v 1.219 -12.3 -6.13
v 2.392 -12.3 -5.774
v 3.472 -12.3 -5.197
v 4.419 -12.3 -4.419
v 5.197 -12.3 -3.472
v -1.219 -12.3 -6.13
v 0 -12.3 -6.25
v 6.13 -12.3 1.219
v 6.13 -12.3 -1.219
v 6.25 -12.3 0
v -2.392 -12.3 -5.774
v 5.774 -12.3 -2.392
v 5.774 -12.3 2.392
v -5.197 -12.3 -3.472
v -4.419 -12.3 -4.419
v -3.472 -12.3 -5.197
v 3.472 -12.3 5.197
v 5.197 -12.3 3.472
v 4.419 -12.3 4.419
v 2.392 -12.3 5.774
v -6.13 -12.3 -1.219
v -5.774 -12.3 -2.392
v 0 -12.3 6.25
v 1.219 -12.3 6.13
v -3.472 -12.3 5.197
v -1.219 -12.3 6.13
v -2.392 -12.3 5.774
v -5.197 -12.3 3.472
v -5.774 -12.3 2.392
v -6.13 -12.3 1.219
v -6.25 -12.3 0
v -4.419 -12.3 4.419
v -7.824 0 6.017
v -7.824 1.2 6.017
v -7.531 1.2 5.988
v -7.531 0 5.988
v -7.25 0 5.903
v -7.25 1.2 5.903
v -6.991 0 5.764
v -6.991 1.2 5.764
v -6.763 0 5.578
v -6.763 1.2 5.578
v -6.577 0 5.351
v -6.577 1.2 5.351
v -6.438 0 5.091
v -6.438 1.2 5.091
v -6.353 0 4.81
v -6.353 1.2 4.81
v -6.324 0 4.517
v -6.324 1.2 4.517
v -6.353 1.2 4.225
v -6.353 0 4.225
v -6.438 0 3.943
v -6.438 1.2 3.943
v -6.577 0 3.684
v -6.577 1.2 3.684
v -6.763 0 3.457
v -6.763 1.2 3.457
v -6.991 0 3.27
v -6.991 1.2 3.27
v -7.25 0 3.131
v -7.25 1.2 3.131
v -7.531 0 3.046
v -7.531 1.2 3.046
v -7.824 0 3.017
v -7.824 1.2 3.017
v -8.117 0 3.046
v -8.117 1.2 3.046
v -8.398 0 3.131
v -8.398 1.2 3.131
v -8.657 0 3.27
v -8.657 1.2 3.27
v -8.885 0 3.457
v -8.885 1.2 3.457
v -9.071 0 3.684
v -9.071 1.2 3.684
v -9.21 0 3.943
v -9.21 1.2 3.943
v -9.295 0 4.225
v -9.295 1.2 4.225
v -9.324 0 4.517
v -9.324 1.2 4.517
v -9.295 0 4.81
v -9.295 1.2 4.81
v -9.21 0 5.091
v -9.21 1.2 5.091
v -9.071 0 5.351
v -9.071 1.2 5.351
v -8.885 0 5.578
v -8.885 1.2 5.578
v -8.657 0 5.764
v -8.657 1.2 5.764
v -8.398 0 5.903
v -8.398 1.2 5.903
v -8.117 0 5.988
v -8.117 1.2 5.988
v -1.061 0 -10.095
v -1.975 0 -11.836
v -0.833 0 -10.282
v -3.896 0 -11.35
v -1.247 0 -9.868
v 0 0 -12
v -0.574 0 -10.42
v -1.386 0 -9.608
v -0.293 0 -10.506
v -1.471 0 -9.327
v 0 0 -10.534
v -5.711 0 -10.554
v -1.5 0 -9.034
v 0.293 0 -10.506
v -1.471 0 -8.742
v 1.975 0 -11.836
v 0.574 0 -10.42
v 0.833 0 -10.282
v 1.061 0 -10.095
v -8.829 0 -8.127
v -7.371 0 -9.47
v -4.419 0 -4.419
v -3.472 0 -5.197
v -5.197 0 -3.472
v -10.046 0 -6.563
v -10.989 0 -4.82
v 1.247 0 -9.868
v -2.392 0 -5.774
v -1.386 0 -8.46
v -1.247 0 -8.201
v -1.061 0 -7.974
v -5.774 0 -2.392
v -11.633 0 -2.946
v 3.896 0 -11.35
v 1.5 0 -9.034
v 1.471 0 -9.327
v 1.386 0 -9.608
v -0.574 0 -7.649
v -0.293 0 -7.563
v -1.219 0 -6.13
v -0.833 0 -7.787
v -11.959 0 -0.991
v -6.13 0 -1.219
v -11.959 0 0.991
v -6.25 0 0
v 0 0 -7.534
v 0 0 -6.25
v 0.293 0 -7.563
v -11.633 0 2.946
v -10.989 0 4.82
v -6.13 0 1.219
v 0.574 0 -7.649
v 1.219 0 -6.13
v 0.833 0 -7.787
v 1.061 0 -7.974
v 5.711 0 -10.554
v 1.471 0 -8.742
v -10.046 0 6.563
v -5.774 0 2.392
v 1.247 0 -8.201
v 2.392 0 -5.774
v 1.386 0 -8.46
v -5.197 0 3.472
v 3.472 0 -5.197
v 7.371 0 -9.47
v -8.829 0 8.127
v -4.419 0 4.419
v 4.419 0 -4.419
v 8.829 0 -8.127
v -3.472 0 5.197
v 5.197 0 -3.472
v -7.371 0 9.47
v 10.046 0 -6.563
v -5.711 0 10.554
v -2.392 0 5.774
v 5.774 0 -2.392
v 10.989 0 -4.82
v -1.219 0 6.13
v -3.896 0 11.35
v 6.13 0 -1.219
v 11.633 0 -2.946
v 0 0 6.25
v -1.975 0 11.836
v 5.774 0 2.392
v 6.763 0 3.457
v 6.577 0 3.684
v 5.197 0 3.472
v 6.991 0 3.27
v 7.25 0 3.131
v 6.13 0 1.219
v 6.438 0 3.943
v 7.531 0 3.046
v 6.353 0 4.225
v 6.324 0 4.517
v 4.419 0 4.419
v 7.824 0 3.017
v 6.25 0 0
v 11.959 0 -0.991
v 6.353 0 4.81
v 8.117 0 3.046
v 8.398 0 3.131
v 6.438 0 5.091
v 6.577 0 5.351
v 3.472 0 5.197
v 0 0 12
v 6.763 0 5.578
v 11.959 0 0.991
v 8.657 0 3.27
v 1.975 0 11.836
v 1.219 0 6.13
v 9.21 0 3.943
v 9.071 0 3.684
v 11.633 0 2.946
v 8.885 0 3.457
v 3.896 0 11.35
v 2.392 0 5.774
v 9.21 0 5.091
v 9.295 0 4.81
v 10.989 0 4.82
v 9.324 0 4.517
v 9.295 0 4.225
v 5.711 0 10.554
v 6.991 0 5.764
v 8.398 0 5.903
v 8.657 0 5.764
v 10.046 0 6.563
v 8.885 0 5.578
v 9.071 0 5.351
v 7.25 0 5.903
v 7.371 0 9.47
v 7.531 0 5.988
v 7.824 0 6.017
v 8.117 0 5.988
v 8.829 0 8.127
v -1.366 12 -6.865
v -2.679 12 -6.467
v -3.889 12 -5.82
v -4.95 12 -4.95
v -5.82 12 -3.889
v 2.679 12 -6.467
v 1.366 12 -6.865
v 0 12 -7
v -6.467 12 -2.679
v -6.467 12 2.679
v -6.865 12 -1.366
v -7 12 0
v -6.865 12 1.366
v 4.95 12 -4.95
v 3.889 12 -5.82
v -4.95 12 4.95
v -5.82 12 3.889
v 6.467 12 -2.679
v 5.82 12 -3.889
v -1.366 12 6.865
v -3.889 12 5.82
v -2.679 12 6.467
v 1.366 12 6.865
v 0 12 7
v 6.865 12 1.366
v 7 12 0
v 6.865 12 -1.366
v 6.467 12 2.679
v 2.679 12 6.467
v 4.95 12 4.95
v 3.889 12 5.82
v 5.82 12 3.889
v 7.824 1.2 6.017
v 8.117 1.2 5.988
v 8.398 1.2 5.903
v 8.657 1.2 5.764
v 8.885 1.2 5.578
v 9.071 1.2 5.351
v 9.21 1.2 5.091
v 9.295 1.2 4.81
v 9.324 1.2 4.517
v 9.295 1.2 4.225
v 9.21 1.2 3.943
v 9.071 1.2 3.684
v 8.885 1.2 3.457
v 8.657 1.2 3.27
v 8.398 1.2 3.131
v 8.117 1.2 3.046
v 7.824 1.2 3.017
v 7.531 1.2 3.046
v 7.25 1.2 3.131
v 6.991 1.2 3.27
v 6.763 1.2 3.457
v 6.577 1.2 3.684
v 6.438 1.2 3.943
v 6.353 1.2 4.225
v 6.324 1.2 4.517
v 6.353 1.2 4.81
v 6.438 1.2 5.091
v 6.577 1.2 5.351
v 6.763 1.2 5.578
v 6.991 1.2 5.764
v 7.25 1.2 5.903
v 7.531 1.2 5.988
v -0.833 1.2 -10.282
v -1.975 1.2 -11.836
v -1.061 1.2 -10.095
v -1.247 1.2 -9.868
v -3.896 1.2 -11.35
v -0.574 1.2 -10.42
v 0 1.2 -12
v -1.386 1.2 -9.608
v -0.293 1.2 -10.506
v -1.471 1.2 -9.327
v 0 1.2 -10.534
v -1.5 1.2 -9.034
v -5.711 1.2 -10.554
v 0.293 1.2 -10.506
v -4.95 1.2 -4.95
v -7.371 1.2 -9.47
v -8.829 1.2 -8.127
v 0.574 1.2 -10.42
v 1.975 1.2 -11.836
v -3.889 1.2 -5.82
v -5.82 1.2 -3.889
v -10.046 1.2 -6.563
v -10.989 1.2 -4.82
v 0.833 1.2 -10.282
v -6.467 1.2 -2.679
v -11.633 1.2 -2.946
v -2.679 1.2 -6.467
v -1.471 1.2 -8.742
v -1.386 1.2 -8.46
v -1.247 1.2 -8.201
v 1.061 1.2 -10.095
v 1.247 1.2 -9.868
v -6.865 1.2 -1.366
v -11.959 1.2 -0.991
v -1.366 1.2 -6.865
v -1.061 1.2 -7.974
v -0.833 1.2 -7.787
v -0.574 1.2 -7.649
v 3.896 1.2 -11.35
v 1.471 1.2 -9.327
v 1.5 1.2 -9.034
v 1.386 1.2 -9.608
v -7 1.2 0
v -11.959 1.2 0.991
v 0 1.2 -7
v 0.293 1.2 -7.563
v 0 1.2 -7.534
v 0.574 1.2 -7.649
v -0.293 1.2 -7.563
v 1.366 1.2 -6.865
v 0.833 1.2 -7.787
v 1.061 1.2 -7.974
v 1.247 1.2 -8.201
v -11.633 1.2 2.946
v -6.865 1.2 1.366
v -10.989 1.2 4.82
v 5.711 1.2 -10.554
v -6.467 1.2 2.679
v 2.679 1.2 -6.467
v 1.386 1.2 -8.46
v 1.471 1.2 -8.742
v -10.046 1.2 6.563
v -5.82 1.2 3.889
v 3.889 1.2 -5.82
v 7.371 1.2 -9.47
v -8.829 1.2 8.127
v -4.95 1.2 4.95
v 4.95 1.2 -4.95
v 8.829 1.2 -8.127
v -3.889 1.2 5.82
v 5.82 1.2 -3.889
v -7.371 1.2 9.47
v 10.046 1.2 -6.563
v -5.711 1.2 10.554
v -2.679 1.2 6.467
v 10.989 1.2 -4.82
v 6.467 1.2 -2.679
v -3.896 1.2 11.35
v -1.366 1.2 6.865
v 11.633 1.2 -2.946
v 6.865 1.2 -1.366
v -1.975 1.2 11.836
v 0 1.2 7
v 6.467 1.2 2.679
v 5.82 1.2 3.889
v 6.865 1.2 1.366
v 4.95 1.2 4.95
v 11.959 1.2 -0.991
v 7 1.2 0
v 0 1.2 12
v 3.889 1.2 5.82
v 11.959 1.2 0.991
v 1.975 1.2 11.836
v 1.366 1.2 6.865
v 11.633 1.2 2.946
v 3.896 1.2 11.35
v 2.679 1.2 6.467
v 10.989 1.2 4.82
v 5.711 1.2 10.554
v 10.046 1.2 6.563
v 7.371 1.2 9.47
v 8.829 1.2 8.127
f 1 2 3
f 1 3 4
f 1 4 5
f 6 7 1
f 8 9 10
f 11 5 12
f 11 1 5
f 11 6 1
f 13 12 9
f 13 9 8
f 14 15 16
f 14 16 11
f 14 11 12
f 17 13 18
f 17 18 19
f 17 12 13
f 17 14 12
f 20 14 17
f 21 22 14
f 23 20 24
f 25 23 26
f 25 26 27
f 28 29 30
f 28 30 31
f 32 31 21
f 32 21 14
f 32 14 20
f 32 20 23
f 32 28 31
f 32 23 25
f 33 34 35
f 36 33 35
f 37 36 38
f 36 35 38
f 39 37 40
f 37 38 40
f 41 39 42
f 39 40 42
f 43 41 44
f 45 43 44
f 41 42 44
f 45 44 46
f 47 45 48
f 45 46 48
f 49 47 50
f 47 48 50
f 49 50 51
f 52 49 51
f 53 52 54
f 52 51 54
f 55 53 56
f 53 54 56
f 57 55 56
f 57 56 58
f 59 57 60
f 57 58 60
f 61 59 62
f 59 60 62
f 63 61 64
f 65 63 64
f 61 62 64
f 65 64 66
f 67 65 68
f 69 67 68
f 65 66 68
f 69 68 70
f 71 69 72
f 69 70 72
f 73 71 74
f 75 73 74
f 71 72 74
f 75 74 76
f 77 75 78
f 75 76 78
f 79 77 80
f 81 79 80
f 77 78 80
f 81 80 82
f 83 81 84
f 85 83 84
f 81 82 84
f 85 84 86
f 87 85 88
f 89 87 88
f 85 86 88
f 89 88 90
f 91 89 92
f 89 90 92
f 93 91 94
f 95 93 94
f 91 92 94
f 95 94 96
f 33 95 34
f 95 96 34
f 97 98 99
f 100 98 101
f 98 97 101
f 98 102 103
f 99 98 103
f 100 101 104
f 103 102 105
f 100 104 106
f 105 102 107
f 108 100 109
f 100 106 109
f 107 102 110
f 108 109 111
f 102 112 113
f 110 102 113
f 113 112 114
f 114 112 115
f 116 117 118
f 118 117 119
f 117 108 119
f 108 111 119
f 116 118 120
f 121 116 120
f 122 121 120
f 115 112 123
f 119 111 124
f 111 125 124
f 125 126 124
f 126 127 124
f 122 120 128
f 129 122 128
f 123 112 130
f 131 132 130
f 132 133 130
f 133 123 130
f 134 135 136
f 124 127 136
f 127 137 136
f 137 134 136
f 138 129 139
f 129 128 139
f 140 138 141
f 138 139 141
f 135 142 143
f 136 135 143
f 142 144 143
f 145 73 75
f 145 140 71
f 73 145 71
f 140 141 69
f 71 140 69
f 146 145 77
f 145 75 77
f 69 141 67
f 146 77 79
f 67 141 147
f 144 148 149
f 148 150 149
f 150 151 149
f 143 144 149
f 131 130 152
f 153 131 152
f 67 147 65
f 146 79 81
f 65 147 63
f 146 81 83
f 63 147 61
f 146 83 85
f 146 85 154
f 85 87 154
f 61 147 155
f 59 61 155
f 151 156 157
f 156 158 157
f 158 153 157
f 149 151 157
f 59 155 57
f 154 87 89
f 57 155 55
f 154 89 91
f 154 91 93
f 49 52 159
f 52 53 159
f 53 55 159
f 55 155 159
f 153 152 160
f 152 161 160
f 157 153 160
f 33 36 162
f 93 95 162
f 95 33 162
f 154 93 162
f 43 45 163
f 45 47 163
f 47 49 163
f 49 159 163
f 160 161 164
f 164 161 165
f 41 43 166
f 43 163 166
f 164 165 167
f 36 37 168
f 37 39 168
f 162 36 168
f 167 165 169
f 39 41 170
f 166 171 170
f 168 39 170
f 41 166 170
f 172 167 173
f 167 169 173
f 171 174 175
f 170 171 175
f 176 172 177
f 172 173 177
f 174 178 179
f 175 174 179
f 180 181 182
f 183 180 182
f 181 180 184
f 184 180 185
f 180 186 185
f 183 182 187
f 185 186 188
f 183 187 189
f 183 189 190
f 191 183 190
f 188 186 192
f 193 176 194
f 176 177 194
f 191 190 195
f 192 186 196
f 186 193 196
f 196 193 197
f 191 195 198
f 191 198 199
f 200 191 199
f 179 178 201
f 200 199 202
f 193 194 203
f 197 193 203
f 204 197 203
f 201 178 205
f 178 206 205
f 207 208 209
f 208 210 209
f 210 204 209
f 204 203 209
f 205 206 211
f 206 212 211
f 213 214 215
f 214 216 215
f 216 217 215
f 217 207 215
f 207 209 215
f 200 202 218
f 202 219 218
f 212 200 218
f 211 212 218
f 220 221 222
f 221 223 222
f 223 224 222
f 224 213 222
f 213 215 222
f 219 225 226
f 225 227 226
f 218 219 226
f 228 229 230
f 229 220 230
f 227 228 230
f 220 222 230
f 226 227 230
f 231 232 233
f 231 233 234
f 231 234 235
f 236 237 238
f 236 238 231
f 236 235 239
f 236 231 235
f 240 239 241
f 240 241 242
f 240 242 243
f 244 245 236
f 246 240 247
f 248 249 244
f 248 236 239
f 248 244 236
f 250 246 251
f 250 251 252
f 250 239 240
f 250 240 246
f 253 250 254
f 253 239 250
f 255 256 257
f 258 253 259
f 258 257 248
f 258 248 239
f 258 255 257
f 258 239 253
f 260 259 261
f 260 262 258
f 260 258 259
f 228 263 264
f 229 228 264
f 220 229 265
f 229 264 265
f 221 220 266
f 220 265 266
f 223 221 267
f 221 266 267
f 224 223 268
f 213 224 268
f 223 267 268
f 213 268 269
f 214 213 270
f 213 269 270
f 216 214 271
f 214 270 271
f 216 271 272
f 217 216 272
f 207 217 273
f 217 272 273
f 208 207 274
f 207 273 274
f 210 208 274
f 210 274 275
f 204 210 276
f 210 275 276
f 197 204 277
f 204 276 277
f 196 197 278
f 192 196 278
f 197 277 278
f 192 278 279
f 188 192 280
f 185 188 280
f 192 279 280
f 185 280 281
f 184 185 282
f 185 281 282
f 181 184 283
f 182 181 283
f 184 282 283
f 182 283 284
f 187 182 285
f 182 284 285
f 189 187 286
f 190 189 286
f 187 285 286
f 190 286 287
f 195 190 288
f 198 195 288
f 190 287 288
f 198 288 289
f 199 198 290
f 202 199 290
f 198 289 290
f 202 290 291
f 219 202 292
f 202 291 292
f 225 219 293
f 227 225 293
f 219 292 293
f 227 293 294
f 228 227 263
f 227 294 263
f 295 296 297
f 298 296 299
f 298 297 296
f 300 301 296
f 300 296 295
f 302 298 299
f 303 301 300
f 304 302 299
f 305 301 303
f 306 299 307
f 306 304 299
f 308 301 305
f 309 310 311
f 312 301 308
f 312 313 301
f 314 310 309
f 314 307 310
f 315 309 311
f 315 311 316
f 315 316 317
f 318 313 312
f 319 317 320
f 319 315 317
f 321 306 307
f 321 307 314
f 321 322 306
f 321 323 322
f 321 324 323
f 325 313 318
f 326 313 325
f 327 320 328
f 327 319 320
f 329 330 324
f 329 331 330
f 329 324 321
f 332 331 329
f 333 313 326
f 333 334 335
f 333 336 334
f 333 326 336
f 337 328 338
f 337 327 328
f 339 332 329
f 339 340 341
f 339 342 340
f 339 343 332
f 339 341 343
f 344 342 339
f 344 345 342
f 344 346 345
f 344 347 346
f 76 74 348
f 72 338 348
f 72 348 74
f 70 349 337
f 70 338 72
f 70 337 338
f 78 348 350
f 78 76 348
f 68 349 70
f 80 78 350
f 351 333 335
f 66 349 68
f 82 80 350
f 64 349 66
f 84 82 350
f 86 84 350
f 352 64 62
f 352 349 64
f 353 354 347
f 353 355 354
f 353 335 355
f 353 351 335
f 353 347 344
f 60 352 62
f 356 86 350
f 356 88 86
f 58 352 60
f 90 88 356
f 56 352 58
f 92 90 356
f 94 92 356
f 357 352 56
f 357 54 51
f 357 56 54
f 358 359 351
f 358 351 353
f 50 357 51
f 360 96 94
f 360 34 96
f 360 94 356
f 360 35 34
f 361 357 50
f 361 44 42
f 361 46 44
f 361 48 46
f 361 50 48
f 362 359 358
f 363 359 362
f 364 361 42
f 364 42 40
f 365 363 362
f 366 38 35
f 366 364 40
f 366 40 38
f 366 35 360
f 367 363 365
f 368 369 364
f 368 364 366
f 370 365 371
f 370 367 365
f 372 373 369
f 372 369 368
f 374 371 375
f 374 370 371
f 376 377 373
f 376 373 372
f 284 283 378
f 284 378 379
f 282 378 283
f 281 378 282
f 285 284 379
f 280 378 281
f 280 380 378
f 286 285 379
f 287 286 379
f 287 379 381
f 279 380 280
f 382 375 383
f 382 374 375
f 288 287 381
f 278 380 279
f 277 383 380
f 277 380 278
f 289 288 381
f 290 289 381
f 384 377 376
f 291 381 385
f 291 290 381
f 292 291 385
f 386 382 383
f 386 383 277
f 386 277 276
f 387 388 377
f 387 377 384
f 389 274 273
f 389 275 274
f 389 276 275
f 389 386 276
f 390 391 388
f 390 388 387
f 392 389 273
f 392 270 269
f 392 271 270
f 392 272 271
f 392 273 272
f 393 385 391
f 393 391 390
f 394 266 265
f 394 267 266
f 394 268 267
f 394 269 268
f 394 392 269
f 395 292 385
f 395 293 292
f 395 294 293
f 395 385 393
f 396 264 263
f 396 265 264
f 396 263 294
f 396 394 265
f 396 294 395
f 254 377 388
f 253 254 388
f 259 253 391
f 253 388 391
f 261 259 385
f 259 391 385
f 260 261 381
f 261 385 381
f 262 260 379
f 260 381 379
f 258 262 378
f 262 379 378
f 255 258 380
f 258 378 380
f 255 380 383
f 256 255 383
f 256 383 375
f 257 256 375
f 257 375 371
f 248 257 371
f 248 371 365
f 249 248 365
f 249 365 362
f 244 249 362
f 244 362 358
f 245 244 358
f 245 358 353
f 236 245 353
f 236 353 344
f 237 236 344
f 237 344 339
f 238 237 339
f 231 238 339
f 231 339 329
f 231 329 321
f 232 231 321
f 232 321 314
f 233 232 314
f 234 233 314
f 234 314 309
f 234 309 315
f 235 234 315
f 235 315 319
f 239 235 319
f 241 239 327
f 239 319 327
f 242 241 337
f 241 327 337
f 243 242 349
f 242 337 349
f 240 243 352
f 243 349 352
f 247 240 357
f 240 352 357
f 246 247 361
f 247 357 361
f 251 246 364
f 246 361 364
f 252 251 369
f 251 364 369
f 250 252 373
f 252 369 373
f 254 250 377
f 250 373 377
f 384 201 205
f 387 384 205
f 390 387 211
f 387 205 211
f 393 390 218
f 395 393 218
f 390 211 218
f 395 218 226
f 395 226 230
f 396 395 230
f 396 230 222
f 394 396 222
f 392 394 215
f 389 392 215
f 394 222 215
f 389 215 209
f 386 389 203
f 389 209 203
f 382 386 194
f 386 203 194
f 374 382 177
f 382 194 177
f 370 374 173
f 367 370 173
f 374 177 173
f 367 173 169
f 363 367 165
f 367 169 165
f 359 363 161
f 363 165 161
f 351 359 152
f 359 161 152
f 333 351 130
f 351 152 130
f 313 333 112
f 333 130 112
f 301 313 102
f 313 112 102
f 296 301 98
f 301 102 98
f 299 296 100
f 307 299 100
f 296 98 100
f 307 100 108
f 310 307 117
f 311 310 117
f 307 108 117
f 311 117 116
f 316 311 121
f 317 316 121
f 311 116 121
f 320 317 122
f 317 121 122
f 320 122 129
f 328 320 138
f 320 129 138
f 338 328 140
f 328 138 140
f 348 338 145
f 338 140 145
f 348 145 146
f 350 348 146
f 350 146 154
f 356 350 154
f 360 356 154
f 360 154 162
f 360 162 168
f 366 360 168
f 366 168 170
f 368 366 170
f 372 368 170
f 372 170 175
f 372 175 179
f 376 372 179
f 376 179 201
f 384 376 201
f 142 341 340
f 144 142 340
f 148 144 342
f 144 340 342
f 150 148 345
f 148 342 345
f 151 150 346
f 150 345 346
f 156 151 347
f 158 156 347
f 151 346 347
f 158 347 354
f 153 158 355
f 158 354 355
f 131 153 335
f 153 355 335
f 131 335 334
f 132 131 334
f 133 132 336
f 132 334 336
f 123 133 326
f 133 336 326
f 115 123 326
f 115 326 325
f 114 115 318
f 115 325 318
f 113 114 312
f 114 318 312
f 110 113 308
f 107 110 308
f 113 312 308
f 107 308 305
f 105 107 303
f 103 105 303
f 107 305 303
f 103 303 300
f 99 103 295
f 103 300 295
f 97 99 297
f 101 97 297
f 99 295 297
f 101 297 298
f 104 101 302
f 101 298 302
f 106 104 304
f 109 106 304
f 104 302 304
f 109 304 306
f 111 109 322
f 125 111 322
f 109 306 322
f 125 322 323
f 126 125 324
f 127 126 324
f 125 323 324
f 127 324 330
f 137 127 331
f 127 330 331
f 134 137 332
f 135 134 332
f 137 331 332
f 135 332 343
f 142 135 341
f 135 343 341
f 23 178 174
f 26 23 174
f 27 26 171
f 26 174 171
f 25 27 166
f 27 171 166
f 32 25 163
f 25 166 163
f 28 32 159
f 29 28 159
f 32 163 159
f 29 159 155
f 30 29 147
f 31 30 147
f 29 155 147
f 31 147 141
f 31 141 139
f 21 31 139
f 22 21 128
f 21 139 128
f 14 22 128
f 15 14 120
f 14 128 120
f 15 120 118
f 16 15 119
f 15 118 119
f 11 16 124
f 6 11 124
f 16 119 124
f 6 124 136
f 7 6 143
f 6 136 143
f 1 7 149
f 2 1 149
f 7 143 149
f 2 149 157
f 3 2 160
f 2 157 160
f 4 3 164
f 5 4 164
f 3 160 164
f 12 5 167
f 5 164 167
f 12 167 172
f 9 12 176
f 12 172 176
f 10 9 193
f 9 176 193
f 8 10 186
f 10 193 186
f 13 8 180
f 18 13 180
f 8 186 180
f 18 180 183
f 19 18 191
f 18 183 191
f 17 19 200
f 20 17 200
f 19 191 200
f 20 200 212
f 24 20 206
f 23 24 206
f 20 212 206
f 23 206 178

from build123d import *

# Parameters (mm, degrees)
SKETCH1_R           = 12
SKETCH1_R_2         = 2.5
BOSS_EXTRUDE1_DEPTH = 1.2
SKETCH2_R           = 1.5
CUT_EXTRUDE1_DEPTH  = 1.2
SKETCH3_R           = 6.25
BOSS_EXTRUDE2_DEPTH = 12.3
SKETCH4_R           = 7
BOSS_EXTRUDE3_DEPTH = 12


with BuildPart() as part:
    # Sketch1 → Boss-Extrude1 (new body)
    with BuildSketch(Plane(origin=(0, 0, 0), x_dir=(1, 0, 0), z_dir=(0, 1, 0))):
        with Locations(Location((0, 0, 0), (0, 0, 270))):
            Circle(SKETCH1_R)
        with Locations(Location((0, 0, 0), (0, 0, 270))):
            Circle(SKETCH1_R_2, mode=Mode.SUBTRACT)
    extrude(amount=BOSS_EXTRUDE1_DEPTH)

    # Sketch2 → Cut-Extrude1 (cut)
    with BuildSketch(Plane(origin=(0, 1.2, 0), x_dir=(1, 0, 0), z_dir=(0, 1, 0))):
        with Locations(Location((0, 9.034469011, 0), (0, 0, 270))):
            Circle(SKETCH2_R)
        with Locations(Location((7.824079673, -4.517234506, 0), (0, 0, 270))):
            Circle(SKETCH2_R)
        with Locations(Location((-7.824079673, -4.517234506, 0), (0, 0, 270))):
            Circle(SKETCH2_R)
    extrude(amount=-CUT_EXTRUDE1_DEPTH, mode=Mode.SUBTRACT)

    # Sketch3 → Boss-Extrude2 (add)
    with BuildSketch(Plane(origin=(0, 0, 0), x_dir=(-1, 0, 0), z_dir=(0, -1, 0))):
        with Locations(Location((0, 0, 0), (0, 0, 270))):
            Circle(SKETCH3_R)
    extrude(amount=BOSS_EXTRUDE2_DEPTH)

    # Sketch4 → Boss-Extrude3 (add)
    with BuildSketch(Plane(origin=(0, 0, 0), x_dir=(1, 0, 0), z_dir=(0, 1, 0))):
        with Locations(Location((0, 0, 0), (0, 0, 270))):
            Circle(SKETCH4_R)
    extrude(amount=BOSS_EXTRUDE3_DEPTH)


solid = part.part
